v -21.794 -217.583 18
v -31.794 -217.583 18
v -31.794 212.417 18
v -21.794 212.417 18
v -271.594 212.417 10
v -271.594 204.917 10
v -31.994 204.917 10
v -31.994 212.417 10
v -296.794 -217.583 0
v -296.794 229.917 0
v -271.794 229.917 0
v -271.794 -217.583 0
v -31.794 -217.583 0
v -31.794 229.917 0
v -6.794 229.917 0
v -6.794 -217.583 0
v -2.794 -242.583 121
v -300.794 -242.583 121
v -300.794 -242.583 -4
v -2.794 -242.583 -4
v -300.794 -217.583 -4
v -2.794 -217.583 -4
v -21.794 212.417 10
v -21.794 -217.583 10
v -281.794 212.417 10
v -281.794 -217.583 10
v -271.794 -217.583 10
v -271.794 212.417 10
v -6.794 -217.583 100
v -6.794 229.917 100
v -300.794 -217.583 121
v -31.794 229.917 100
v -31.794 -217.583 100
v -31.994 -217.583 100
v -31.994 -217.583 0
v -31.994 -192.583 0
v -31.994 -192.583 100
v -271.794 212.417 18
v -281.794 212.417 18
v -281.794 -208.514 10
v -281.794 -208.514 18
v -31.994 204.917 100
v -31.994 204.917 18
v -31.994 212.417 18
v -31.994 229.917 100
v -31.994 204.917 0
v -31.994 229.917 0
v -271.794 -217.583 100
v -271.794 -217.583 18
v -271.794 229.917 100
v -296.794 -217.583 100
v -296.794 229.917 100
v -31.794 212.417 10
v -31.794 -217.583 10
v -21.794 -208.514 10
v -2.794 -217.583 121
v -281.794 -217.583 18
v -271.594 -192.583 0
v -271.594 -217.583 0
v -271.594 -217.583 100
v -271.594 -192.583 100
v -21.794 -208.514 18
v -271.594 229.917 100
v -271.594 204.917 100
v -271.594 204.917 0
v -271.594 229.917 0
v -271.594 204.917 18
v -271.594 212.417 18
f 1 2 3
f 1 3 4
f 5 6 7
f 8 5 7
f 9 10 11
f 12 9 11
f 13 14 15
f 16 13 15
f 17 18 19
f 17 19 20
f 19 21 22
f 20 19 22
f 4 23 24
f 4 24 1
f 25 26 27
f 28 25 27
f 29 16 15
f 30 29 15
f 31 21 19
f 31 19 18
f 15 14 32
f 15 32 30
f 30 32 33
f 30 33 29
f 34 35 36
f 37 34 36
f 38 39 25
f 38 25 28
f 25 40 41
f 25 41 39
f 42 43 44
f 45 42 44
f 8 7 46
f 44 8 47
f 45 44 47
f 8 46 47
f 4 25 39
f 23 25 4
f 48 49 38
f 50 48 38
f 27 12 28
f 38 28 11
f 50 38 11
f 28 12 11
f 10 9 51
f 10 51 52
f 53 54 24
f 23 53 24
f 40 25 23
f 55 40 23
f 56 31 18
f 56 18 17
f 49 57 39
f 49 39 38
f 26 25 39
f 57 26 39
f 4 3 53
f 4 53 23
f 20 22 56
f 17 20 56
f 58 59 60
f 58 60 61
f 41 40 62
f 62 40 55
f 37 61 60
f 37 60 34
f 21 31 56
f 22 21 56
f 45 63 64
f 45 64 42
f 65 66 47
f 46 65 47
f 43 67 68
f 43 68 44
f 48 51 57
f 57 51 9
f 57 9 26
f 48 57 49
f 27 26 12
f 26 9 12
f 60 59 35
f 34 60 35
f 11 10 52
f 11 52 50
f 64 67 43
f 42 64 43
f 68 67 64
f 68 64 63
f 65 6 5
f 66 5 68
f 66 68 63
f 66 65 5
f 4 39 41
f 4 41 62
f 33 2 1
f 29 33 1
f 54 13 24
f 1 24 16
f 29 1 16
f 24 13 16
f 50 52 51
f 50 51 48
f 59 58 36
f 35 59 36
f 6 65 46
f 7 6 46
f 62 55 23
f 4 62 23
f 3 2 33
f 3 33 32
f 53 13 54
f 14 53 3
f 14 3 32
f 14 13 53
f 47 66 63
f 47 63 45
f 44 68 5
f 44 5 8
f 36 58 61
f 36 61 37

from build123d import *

# Parameters (mm, degrees)
F0_W     = 25
F0_H     = 447.5
F1_DEPTH = 100
F0_W_2   = 239.6
F0_H_2   = 25
F2_W     = 260
F2_H     = 8
F3_DEPTH = 430
F4_W     = 260
F4_H     = 420.9302674979
F5_DEPTH = 8
F6_W     = 298
F6_H     = 125
F7_DEPTH = 25


with BuildPart() as f1:
    # F0 (on Top) → F1 (new body)
    with BuildSketch(Plane.XY):
        with Locations((-284.2940492184, 6.1665456742)):
            Rectangle(F0_W, F0_H)
    extrude(amount=F1_DEPTH)


with BuildPart() as f1b:
    # F0 (on Top) → F1, piece 2 (new body)
    with BuildSketch(Plane.XY):
        with Locations((-19.2940492184, 6.1665456742)):
            Rectangle(F0_W, F0_H)
    extrude(amount=F1_DEPTH)


with BuildPart() as f1c:
    # F0 (on Top) → F1, piece 3 (new body)
    with BuildSketch(Plane.XY):
        with Locations((-151.7940492184, 217.4165456742)):
            Rectangle(F0_W_2, F0_H_2)
    extrude(amount=F1_DEPTH)


with BuildPart() as f1d:
    # F0 (on Top) → F1, piece 4 (new body)
    with BuildSketch(Plane.XY):
        with Locations((-151.7940492184, -205.0834543258)):
            Rectangle(F0_W_2, F0_H_2)
    extrude(amount=F1_DEPTH)


with BuildPart() as f3_tool:
    # F2 (on face) → F3 (new body)
    with BuildSketch(Plane.XZ.offset(217.5834543258)):
        with Locations((-151.7940492184, 14)):
            Rectangle(F2_W, F2_H)
    extrude(amount=-F3_DEPTH)


with BuildPart() as f1_1:
    add(f1.part)

    # F3: cut by f3_tool
    add(f3_tool.part, mode=Mode.SUBTRACT)


with BuildPart() as f1b_1:
    add(f1b.part)

    # F3: cut by f3_tool
    add(f3_tool.part, mode=Mode.SUBTRACT)


with BuildPart() as f1c_1:
    add(f1c.part)

    # F3: cut by f3_tool
    add(f3_tool.part, mode=Mode.SUBTRACT)


with BuildPart() as f5:
    # F4 (on face) → F5 (new body)
    with BuildSketch(Plane.XY.offset(10)):
        with Locations((-151.7940492184, 1.9514119253)):
            Rectangle(F4_W, F4_H)
    extrude(amount=F5_DEPTH)


with BuildPart() as f7:
    # F6 (on face) → F7 (new body)
    with BuildSketch(Plane.XZ.offset(217.5834543258)):
        with Locations((-151.7940492184, 58.5)):
            Rectangle(F6_W, F6_H)
    extrude(amount=F7_DEPTH)


solid = Compound([f1d.part, f1_1.part, f1b_1.part, f1c_1.part, f5.part, f7.part])
